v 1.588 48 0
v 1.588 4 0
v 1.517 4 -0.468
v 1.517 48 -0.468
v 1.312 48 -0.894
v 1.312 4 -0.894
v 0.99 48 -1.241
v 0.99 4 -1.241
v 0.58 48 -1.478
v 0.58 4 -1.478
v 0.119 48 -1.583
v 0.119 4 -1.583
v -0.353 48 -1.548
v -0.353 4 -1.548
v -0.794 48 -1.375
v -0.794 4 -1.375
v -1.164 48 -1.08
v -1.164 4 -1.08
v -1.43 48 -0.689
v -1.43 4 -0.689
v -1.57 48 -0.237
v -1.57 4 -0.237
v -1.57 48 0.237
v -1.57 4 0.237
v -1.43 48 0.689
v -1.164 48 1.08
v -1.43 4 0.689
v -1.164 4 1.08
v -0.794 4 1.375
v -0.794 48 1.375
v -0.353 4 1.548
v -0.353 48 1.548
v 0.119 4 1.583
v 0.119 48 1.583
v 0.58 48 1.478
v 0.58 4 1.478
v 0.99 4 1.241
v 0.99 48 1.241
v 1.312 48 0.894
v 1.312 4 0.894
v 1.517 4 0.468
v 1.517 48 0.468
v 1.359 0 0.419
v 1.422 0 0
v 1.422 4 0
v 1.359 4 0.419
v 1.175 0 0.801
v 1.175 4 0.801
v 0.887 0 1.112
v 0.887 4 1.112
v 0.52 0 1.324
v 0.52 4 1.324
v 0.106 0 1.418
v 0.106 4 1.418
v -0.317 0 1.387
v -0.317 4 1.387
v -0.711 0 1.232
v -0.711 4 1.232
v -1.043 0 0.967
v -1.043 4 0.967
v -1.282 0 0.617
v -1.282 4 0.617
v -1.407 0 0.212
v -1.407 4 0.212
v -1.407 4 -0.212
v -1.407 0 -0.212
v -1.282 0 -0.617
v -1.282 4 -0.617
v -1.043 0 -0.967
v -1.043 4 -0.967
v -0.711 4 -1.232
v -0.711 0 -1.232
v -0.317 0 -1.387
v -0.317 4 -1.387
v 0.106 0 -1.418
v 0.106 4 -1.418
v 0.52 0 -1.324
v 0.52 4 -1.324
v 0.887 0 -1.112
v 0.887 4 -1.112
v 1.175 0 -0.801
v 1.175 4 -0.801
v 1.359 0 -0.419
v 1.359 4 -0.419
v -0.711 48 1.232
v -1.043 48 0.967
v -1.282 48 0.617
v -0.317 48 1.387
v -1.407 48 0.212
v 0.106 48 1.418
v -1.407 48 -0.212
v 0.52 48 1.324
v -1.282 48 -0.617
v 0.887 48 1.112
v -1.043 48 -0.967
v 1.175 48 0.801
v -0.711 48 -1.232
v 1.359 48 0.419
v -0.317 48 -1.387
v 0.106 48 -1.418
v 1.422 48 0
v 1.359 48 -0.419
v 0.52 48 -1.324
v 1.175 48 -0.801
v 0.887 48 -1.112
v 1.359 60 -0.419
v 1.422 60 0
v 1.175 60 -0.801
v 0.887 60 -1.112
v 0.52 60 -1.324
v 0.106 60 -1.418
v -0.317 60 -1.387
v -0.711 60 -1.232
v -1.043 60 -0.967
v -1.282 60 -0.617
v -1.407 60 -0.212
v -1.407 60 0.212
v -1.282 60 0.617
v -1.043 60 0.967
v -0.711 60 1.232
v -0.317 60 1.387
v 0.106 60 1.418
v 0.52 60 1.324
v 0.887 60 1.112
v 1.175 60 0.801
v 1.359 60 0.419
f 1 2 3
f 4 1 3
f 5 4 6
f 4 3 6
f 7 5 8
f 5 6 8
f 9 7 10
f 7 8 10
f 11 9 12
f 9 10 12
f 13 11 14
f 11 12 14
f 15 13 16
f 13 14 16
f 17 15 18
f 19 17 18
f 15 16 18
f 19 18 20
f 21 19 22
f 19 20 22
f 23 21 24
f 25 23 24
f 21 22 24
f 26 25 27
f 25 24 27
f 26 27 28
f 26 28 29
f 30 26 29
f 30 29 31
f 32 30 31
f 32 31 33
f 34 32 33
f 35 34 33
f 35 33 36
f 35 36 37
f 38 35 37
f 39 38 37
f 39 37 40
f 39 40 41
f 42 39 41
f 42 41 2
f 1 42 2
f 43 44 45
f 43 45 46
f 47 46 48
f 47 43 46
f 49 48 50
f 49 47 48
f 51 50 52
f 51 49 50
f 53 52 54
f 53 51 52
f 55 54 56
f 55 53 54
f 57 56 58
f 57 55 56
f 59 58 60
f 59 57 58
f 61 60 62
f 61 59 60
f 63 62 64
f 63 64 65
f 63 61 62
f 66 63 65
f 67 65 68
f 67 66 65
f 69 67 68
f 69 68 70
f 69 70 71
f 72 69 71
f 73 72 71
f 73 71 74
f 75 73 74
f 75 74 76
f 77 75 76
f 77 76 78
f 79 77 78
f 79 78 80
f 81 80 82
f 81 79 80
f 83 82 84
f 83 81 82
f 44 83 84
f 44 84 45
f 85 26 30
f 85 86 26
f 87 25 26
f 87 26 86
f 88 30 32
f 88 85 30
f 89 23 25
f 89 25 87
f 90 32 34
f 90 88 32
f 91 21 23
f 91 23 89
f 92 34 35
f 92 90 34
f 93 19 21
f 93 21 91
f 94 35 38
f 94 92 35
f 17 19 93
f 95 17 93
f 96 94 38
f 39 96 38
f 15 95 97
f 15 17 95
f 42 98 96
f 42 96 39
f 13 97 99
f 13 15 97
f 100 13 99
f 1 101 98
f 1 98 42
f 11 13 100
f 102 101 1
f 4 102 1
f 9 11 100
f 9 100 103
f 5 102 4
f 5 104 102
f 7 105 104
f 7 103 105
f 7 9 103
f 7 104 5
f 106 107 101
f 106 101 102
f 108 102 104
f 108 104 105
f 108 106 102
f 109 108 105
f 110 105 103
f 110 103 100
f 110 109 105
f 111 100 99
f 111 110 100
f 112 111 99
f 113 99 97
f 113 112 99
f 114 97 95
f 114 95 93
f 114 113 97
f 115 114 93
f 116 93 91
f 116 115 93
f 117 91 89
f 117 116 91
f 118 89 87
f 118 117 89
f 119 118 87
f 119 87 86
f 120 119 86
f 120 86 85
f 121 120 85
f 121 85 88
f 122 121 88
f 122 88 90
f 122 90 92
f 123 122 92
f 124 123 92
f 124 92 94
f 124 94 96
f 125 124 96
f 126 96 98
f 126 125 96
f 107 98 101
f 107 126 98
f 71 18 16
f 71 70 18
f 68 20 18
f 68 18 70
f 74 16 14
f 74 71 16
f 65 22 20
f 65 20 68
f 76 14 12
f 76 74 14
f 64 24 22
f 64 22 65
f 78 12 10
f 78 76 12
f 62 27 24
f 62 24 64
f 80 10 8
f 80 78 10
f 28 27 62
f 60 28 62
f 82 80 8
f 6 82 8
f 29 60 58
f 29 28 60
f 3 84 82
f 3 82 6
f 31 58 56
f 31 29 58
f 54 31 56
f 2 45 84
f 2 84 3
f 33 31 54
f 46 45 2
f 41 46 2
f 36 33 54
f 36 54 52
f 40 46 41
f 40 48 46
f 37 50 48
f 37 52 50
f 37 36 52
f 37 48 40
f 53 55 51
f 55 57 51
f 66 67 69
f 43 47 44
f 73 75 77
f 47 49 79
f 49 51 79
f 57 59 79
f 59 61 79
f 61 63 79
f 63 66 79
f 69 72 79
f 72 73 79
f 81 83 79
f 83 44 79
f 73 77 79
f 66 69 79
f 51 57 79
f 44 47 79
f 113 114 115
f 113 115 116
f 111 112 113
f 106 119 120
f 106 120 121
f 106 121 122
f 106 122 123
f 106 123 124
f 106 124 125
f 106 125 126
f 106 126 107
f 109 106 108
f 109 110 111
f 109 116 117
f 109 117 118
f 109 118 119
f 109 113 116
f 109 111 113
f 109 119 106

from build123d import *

# Parameters (mm, degrees)
SKETCH1_R           = 1.5875
BOSS_EXTRUDE1_DEPTH = 60
SKETCH2_R           = 1.5875
SKETCH2_R_2         = 1.4224
CUT_EXTRUDE1_DEPTH  = 4
SKETCH7_R           = 1.5875
SKETCH7_R_2         = 1.4224
CUT_EXTRUDE2_DEPTH  = 12


with BuildPart() as part:
    # Sketch1 → Boss-Extrude1 (new body)
    with BuildSketch(Plane(origin=(0, 0, 0), x_dir=(1, 0, 0), z_dir=(0, 1, 0))):
        Circle(SKETCH1_R)
    extrude(amount=BOSS_EXTRUDE1_DEPTH)

    # Sketch2 → Cut-Extrude1 (cut)
    with BuildSketch(Plane.XZ):
        Circle(SKETCH2_R)
        Circle(SKETCH2_R_2, mode=Mode.SUBTRACT)
    extrude(amount=-CUT_EXTRUDE1_DEPTH, mode=Mode.SUBTRACT)

    # Sketch7 → Cut-Extrude2 (cut)
    with BuildSketch(Plane(origin=(0, 60, 0), x_dir=(1, 0, 0), z_dir=(0, 1, 0))):
        Circle(SKETCH7_R)
        Circle(SKETCH7_R_2, mode=Mode.SUBTRACT)
    extrude(amount=-CUT_EXTRUDE2_DEPTH, mode=Mode.SUBTRACT)


solid = part.part
